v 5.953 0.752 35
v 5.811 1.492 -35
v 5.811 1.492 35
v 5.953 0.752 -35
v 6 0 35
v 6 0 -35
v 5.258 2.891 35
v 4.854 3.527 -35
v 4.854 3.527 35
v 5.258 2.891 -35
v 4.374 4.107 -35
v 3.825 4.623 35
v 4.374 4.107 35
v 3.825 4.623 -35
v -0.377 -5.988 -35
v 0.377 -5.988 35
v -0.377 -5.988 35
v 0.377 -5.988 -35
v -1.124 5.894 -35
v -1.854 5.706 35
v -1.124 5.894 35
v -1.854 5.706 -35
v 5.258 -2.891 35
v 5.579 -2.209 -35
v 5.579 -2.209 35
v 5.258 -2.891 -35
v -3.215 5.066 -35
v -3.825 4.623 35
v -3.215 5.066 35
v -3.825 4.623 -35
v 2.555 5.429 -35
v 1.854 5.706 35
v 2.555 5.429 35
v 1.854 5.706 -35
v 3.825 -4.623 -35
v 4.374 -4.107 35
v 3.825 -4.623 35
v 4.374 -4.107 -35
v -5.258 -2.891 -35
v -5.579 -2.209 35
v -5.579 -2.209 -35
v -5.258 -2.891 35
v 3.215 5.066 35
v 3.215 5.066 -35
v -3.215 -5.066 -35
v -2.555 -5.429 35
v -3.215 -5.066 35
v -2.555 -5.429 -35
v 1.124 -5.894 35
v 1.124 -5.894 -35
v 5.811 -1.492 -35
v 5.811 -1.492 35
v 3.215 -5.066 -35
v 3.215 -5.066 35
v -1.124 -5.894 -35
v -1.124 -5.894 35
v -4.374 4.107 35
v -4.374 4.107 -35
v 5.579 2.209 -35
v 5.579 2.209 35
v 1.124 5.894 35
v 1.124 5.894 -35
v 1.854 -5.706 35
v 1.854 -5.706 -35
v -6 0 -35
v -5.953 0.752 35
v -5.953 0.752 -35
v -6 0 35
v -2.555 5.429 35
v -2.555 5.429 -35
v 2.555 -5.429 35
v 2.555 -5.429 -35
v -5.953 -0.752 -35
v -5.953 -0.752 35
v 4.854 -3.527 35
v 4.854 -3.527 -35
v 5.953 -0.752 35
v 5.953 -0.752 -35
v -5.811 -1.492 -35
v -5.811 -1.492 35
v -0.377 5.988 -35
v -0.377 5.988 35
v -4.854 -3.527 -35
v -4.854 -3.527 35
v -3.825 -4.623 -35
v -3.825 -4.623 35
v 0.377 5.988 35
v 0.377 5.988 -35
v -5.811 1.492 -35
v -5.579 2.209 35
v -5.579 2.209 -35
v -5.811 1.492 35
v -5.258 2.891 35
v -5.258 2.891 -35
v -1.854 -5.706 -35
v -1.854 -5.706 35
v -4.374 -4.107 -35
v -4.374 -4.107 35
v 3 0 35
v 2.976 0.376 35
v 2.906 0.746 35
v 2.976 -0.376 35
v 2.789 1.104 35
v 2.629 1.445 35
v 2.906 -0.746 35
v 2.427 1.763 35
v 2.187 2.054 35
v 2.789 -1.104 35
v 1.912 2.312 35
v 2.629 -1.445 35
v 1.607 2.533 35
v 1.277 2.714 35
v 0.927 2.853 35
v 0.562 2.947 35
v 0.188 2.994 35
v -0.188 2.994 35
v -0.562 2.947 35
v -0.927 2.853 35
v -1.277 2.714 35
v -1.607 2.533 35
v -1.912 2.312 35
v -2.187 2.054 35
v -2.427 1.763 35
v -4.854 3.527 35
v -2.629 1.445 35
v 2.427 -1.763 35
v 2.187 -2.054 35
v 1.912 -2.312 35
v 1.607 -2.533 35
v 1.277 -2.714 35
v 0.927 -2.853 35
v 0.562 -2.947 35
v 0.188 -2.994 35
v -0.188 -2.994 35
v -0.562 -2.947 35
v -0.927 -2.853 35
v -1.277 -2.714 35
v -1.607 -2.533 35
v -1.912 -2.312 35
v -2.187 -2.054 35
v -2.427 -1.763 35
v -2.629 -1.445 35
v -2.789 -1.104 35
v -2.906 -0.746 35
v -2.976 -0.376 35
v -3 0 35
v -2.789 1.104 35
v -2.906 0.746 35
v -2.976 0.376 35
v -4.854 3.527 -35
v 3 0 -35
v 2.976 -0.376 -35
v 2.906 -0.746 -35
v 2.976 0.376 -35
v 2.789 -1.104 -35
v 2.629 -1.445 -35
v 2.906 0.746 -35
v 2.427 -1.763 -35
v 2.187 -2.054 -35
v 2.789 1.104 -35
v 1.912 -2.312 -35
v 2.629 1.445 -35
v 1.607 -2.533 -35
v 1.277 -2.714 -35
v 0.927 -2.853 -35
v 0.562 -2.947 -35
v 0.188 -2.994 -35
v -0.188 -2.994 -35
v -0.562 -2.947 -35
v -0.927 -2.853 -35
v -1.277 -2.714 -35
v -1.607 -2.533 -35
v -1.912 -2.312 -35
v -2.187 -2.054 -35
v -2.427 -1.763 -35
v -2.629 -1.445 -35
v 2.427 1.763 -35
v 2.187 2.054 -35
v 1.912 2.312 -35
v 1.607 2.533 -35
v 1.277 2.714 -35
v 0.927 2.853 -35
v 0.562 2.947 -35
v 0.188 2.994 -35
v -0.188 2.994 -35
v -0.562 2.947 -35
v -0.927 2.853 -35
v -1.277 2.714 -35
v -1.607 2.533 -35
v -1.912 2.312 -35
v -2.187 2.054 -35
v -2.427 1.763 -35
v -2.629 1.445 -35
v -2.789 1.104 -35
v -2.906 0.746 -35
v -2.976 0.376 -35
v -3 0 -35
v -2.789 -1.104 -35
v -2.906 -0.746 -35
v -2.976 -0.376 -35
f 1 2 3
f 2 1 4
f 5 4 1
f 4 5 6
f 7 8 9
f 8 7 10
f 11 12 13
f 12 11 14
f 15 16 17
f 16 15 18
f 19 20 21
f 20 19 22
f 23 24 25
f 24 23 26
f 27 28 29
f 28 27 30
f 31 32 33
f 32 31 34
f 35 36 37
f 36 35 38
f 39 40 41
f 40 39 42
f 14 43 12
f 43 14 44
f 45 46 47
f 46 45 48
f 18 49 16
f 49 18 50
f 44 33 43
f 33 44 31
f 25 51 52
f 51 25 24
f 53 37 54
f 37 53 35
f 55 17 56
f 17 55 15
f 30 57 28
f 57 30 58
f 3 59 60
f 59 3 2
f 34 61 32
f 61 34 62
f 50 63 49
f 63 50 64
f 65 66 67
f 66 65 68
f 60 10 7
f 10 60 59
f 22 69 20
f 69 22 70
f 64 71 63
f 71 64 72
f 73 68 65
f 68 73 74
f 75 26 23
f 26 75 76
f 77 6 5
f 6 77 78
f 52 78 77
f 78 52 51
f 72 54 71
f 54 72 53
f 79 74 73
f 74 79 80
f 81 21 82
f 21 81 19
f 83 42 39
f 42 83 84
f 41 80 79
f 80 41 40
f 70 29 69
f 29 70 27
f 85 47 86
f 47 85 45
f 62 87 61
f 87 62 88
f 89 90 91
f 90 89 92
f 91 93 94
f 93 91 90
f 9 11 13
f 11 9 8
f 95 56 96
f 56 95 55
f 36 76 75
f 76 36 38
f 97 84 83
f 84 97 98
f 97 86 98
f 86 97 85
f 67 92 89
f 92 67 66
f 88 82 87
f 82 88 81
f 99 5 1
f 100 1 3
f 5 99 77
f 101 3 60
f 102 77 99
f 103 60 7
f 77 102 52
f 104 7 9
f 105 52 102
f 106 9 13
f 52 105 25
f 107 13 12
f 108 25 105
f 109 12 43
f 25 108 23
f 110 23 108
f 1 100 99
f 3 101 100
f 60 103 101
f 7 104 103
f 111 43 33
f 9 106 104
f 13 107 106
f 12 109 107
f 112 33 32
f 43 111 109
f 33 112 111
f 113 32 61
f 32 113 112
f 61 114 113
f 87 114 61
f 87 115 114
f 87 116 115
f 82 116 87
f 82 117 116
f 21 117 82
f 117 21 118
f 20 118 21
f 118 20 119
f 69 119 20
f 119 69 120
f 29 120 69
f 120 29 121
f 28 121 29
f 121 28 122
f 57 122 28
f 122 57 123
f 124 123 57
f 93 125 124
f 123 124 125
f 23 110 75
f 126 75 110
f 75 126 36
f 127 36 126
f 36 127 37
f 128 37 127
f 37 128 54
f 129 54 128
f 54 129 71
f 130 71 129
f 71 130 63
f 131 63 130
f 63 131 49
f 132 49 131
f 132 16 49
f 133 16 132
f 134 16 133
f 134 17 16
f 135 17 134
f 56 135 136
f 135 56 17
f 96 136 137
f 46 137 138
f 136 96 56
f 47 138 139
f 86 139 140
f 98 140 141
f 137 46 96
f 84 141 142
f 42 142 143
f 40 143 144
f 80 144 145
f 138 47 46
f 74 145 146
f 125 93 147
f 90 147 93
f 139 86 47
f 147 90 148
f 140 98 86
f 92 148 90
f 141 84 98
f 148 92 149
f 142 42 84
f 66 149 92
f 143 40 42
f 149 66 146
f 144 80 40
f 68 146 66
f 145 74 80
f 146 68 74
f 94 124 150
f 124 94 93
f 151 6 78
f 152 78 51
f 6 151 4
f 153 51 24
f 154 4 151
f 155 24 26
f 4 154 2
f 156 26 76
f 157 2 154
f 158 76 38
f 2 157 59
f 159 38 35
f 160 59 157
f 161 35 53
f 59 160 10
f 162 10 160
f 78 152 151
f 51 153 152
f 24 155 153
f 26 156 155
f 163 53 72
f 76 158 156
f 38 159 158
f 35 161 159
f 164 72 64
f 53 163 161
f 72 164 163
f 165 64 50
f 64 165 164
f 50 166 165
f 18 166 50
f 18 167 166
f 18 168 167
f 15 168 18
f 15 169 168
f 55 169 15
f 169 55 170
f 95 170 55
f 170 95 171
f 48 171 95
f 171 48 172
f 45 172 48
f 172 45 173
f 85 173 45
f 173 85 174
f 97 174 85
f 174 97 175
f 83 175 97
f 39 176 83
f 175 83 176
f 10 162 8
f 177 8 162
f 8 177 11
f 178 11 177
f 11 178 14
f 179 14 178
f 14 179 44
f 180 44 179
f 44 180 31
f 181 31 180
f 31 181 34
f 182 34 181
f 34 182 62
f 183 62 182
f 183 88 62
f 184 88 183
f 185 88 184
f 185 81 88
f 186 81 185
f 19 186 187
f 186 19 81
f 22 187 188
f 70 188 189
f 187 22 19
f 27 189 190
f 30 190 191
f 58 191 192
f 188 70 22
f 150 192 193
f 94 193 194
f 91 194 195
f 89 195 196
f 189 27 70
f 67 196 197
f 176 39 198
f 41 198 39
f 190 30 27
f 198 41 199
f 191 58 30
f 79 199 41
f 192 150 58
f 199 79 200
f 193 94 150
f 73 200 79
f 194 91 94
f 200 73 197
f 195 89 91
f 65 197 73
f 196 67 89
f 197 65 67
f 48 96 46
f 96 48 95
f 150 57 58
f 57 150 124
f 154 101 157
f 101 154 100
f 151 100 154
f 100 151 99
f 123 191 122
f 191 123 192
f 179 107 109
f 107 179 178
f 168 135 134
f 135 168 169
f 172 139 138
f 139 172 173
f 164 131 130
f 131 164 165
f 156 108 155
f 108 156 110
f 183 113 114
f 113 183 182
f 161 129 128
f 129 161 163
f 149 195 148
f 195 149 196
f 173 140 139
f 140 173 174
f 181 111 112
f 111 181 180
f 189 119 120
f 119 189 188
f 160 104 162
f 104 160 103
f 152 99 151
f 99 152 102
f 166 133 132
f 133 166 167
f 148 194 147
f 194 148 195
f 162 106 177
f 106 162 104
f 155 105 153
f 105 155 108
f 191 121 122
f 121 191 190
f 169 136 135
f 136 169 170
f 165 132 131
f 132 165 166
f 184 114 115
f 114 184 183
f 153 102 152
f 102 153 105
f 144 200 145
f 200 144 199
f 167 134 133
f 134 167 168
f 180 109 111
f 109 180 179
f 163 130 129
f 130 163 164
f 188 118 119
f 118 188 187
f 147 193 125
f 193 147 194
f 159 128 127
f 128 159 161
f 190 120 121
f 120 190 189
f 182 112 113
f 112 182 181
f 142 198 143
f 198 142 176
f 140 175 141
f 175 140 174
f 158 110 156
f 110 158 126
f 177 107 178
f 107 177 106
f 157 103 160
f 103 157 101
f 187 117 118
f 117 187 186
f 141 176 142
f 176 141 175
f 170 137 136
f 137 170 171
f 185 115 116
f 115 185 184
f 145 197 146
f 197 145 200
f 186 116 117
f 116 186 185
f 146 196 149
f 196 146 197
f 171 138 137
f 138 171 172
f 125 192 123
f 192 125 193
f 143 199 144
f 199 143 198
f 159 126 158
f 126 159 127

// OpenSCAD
$fn = 50;


difference() {
	union() {
		translate(v = [0, 0, -35.0000000000]) {
			cylinder(h = 70, r = 6.0000000000);
		}
	}
	union() {
		translate(v = [0, 0, -100.0000000000]) {
			cylinder(h = 200, r = 3.0000000000);
		}
	}
}
